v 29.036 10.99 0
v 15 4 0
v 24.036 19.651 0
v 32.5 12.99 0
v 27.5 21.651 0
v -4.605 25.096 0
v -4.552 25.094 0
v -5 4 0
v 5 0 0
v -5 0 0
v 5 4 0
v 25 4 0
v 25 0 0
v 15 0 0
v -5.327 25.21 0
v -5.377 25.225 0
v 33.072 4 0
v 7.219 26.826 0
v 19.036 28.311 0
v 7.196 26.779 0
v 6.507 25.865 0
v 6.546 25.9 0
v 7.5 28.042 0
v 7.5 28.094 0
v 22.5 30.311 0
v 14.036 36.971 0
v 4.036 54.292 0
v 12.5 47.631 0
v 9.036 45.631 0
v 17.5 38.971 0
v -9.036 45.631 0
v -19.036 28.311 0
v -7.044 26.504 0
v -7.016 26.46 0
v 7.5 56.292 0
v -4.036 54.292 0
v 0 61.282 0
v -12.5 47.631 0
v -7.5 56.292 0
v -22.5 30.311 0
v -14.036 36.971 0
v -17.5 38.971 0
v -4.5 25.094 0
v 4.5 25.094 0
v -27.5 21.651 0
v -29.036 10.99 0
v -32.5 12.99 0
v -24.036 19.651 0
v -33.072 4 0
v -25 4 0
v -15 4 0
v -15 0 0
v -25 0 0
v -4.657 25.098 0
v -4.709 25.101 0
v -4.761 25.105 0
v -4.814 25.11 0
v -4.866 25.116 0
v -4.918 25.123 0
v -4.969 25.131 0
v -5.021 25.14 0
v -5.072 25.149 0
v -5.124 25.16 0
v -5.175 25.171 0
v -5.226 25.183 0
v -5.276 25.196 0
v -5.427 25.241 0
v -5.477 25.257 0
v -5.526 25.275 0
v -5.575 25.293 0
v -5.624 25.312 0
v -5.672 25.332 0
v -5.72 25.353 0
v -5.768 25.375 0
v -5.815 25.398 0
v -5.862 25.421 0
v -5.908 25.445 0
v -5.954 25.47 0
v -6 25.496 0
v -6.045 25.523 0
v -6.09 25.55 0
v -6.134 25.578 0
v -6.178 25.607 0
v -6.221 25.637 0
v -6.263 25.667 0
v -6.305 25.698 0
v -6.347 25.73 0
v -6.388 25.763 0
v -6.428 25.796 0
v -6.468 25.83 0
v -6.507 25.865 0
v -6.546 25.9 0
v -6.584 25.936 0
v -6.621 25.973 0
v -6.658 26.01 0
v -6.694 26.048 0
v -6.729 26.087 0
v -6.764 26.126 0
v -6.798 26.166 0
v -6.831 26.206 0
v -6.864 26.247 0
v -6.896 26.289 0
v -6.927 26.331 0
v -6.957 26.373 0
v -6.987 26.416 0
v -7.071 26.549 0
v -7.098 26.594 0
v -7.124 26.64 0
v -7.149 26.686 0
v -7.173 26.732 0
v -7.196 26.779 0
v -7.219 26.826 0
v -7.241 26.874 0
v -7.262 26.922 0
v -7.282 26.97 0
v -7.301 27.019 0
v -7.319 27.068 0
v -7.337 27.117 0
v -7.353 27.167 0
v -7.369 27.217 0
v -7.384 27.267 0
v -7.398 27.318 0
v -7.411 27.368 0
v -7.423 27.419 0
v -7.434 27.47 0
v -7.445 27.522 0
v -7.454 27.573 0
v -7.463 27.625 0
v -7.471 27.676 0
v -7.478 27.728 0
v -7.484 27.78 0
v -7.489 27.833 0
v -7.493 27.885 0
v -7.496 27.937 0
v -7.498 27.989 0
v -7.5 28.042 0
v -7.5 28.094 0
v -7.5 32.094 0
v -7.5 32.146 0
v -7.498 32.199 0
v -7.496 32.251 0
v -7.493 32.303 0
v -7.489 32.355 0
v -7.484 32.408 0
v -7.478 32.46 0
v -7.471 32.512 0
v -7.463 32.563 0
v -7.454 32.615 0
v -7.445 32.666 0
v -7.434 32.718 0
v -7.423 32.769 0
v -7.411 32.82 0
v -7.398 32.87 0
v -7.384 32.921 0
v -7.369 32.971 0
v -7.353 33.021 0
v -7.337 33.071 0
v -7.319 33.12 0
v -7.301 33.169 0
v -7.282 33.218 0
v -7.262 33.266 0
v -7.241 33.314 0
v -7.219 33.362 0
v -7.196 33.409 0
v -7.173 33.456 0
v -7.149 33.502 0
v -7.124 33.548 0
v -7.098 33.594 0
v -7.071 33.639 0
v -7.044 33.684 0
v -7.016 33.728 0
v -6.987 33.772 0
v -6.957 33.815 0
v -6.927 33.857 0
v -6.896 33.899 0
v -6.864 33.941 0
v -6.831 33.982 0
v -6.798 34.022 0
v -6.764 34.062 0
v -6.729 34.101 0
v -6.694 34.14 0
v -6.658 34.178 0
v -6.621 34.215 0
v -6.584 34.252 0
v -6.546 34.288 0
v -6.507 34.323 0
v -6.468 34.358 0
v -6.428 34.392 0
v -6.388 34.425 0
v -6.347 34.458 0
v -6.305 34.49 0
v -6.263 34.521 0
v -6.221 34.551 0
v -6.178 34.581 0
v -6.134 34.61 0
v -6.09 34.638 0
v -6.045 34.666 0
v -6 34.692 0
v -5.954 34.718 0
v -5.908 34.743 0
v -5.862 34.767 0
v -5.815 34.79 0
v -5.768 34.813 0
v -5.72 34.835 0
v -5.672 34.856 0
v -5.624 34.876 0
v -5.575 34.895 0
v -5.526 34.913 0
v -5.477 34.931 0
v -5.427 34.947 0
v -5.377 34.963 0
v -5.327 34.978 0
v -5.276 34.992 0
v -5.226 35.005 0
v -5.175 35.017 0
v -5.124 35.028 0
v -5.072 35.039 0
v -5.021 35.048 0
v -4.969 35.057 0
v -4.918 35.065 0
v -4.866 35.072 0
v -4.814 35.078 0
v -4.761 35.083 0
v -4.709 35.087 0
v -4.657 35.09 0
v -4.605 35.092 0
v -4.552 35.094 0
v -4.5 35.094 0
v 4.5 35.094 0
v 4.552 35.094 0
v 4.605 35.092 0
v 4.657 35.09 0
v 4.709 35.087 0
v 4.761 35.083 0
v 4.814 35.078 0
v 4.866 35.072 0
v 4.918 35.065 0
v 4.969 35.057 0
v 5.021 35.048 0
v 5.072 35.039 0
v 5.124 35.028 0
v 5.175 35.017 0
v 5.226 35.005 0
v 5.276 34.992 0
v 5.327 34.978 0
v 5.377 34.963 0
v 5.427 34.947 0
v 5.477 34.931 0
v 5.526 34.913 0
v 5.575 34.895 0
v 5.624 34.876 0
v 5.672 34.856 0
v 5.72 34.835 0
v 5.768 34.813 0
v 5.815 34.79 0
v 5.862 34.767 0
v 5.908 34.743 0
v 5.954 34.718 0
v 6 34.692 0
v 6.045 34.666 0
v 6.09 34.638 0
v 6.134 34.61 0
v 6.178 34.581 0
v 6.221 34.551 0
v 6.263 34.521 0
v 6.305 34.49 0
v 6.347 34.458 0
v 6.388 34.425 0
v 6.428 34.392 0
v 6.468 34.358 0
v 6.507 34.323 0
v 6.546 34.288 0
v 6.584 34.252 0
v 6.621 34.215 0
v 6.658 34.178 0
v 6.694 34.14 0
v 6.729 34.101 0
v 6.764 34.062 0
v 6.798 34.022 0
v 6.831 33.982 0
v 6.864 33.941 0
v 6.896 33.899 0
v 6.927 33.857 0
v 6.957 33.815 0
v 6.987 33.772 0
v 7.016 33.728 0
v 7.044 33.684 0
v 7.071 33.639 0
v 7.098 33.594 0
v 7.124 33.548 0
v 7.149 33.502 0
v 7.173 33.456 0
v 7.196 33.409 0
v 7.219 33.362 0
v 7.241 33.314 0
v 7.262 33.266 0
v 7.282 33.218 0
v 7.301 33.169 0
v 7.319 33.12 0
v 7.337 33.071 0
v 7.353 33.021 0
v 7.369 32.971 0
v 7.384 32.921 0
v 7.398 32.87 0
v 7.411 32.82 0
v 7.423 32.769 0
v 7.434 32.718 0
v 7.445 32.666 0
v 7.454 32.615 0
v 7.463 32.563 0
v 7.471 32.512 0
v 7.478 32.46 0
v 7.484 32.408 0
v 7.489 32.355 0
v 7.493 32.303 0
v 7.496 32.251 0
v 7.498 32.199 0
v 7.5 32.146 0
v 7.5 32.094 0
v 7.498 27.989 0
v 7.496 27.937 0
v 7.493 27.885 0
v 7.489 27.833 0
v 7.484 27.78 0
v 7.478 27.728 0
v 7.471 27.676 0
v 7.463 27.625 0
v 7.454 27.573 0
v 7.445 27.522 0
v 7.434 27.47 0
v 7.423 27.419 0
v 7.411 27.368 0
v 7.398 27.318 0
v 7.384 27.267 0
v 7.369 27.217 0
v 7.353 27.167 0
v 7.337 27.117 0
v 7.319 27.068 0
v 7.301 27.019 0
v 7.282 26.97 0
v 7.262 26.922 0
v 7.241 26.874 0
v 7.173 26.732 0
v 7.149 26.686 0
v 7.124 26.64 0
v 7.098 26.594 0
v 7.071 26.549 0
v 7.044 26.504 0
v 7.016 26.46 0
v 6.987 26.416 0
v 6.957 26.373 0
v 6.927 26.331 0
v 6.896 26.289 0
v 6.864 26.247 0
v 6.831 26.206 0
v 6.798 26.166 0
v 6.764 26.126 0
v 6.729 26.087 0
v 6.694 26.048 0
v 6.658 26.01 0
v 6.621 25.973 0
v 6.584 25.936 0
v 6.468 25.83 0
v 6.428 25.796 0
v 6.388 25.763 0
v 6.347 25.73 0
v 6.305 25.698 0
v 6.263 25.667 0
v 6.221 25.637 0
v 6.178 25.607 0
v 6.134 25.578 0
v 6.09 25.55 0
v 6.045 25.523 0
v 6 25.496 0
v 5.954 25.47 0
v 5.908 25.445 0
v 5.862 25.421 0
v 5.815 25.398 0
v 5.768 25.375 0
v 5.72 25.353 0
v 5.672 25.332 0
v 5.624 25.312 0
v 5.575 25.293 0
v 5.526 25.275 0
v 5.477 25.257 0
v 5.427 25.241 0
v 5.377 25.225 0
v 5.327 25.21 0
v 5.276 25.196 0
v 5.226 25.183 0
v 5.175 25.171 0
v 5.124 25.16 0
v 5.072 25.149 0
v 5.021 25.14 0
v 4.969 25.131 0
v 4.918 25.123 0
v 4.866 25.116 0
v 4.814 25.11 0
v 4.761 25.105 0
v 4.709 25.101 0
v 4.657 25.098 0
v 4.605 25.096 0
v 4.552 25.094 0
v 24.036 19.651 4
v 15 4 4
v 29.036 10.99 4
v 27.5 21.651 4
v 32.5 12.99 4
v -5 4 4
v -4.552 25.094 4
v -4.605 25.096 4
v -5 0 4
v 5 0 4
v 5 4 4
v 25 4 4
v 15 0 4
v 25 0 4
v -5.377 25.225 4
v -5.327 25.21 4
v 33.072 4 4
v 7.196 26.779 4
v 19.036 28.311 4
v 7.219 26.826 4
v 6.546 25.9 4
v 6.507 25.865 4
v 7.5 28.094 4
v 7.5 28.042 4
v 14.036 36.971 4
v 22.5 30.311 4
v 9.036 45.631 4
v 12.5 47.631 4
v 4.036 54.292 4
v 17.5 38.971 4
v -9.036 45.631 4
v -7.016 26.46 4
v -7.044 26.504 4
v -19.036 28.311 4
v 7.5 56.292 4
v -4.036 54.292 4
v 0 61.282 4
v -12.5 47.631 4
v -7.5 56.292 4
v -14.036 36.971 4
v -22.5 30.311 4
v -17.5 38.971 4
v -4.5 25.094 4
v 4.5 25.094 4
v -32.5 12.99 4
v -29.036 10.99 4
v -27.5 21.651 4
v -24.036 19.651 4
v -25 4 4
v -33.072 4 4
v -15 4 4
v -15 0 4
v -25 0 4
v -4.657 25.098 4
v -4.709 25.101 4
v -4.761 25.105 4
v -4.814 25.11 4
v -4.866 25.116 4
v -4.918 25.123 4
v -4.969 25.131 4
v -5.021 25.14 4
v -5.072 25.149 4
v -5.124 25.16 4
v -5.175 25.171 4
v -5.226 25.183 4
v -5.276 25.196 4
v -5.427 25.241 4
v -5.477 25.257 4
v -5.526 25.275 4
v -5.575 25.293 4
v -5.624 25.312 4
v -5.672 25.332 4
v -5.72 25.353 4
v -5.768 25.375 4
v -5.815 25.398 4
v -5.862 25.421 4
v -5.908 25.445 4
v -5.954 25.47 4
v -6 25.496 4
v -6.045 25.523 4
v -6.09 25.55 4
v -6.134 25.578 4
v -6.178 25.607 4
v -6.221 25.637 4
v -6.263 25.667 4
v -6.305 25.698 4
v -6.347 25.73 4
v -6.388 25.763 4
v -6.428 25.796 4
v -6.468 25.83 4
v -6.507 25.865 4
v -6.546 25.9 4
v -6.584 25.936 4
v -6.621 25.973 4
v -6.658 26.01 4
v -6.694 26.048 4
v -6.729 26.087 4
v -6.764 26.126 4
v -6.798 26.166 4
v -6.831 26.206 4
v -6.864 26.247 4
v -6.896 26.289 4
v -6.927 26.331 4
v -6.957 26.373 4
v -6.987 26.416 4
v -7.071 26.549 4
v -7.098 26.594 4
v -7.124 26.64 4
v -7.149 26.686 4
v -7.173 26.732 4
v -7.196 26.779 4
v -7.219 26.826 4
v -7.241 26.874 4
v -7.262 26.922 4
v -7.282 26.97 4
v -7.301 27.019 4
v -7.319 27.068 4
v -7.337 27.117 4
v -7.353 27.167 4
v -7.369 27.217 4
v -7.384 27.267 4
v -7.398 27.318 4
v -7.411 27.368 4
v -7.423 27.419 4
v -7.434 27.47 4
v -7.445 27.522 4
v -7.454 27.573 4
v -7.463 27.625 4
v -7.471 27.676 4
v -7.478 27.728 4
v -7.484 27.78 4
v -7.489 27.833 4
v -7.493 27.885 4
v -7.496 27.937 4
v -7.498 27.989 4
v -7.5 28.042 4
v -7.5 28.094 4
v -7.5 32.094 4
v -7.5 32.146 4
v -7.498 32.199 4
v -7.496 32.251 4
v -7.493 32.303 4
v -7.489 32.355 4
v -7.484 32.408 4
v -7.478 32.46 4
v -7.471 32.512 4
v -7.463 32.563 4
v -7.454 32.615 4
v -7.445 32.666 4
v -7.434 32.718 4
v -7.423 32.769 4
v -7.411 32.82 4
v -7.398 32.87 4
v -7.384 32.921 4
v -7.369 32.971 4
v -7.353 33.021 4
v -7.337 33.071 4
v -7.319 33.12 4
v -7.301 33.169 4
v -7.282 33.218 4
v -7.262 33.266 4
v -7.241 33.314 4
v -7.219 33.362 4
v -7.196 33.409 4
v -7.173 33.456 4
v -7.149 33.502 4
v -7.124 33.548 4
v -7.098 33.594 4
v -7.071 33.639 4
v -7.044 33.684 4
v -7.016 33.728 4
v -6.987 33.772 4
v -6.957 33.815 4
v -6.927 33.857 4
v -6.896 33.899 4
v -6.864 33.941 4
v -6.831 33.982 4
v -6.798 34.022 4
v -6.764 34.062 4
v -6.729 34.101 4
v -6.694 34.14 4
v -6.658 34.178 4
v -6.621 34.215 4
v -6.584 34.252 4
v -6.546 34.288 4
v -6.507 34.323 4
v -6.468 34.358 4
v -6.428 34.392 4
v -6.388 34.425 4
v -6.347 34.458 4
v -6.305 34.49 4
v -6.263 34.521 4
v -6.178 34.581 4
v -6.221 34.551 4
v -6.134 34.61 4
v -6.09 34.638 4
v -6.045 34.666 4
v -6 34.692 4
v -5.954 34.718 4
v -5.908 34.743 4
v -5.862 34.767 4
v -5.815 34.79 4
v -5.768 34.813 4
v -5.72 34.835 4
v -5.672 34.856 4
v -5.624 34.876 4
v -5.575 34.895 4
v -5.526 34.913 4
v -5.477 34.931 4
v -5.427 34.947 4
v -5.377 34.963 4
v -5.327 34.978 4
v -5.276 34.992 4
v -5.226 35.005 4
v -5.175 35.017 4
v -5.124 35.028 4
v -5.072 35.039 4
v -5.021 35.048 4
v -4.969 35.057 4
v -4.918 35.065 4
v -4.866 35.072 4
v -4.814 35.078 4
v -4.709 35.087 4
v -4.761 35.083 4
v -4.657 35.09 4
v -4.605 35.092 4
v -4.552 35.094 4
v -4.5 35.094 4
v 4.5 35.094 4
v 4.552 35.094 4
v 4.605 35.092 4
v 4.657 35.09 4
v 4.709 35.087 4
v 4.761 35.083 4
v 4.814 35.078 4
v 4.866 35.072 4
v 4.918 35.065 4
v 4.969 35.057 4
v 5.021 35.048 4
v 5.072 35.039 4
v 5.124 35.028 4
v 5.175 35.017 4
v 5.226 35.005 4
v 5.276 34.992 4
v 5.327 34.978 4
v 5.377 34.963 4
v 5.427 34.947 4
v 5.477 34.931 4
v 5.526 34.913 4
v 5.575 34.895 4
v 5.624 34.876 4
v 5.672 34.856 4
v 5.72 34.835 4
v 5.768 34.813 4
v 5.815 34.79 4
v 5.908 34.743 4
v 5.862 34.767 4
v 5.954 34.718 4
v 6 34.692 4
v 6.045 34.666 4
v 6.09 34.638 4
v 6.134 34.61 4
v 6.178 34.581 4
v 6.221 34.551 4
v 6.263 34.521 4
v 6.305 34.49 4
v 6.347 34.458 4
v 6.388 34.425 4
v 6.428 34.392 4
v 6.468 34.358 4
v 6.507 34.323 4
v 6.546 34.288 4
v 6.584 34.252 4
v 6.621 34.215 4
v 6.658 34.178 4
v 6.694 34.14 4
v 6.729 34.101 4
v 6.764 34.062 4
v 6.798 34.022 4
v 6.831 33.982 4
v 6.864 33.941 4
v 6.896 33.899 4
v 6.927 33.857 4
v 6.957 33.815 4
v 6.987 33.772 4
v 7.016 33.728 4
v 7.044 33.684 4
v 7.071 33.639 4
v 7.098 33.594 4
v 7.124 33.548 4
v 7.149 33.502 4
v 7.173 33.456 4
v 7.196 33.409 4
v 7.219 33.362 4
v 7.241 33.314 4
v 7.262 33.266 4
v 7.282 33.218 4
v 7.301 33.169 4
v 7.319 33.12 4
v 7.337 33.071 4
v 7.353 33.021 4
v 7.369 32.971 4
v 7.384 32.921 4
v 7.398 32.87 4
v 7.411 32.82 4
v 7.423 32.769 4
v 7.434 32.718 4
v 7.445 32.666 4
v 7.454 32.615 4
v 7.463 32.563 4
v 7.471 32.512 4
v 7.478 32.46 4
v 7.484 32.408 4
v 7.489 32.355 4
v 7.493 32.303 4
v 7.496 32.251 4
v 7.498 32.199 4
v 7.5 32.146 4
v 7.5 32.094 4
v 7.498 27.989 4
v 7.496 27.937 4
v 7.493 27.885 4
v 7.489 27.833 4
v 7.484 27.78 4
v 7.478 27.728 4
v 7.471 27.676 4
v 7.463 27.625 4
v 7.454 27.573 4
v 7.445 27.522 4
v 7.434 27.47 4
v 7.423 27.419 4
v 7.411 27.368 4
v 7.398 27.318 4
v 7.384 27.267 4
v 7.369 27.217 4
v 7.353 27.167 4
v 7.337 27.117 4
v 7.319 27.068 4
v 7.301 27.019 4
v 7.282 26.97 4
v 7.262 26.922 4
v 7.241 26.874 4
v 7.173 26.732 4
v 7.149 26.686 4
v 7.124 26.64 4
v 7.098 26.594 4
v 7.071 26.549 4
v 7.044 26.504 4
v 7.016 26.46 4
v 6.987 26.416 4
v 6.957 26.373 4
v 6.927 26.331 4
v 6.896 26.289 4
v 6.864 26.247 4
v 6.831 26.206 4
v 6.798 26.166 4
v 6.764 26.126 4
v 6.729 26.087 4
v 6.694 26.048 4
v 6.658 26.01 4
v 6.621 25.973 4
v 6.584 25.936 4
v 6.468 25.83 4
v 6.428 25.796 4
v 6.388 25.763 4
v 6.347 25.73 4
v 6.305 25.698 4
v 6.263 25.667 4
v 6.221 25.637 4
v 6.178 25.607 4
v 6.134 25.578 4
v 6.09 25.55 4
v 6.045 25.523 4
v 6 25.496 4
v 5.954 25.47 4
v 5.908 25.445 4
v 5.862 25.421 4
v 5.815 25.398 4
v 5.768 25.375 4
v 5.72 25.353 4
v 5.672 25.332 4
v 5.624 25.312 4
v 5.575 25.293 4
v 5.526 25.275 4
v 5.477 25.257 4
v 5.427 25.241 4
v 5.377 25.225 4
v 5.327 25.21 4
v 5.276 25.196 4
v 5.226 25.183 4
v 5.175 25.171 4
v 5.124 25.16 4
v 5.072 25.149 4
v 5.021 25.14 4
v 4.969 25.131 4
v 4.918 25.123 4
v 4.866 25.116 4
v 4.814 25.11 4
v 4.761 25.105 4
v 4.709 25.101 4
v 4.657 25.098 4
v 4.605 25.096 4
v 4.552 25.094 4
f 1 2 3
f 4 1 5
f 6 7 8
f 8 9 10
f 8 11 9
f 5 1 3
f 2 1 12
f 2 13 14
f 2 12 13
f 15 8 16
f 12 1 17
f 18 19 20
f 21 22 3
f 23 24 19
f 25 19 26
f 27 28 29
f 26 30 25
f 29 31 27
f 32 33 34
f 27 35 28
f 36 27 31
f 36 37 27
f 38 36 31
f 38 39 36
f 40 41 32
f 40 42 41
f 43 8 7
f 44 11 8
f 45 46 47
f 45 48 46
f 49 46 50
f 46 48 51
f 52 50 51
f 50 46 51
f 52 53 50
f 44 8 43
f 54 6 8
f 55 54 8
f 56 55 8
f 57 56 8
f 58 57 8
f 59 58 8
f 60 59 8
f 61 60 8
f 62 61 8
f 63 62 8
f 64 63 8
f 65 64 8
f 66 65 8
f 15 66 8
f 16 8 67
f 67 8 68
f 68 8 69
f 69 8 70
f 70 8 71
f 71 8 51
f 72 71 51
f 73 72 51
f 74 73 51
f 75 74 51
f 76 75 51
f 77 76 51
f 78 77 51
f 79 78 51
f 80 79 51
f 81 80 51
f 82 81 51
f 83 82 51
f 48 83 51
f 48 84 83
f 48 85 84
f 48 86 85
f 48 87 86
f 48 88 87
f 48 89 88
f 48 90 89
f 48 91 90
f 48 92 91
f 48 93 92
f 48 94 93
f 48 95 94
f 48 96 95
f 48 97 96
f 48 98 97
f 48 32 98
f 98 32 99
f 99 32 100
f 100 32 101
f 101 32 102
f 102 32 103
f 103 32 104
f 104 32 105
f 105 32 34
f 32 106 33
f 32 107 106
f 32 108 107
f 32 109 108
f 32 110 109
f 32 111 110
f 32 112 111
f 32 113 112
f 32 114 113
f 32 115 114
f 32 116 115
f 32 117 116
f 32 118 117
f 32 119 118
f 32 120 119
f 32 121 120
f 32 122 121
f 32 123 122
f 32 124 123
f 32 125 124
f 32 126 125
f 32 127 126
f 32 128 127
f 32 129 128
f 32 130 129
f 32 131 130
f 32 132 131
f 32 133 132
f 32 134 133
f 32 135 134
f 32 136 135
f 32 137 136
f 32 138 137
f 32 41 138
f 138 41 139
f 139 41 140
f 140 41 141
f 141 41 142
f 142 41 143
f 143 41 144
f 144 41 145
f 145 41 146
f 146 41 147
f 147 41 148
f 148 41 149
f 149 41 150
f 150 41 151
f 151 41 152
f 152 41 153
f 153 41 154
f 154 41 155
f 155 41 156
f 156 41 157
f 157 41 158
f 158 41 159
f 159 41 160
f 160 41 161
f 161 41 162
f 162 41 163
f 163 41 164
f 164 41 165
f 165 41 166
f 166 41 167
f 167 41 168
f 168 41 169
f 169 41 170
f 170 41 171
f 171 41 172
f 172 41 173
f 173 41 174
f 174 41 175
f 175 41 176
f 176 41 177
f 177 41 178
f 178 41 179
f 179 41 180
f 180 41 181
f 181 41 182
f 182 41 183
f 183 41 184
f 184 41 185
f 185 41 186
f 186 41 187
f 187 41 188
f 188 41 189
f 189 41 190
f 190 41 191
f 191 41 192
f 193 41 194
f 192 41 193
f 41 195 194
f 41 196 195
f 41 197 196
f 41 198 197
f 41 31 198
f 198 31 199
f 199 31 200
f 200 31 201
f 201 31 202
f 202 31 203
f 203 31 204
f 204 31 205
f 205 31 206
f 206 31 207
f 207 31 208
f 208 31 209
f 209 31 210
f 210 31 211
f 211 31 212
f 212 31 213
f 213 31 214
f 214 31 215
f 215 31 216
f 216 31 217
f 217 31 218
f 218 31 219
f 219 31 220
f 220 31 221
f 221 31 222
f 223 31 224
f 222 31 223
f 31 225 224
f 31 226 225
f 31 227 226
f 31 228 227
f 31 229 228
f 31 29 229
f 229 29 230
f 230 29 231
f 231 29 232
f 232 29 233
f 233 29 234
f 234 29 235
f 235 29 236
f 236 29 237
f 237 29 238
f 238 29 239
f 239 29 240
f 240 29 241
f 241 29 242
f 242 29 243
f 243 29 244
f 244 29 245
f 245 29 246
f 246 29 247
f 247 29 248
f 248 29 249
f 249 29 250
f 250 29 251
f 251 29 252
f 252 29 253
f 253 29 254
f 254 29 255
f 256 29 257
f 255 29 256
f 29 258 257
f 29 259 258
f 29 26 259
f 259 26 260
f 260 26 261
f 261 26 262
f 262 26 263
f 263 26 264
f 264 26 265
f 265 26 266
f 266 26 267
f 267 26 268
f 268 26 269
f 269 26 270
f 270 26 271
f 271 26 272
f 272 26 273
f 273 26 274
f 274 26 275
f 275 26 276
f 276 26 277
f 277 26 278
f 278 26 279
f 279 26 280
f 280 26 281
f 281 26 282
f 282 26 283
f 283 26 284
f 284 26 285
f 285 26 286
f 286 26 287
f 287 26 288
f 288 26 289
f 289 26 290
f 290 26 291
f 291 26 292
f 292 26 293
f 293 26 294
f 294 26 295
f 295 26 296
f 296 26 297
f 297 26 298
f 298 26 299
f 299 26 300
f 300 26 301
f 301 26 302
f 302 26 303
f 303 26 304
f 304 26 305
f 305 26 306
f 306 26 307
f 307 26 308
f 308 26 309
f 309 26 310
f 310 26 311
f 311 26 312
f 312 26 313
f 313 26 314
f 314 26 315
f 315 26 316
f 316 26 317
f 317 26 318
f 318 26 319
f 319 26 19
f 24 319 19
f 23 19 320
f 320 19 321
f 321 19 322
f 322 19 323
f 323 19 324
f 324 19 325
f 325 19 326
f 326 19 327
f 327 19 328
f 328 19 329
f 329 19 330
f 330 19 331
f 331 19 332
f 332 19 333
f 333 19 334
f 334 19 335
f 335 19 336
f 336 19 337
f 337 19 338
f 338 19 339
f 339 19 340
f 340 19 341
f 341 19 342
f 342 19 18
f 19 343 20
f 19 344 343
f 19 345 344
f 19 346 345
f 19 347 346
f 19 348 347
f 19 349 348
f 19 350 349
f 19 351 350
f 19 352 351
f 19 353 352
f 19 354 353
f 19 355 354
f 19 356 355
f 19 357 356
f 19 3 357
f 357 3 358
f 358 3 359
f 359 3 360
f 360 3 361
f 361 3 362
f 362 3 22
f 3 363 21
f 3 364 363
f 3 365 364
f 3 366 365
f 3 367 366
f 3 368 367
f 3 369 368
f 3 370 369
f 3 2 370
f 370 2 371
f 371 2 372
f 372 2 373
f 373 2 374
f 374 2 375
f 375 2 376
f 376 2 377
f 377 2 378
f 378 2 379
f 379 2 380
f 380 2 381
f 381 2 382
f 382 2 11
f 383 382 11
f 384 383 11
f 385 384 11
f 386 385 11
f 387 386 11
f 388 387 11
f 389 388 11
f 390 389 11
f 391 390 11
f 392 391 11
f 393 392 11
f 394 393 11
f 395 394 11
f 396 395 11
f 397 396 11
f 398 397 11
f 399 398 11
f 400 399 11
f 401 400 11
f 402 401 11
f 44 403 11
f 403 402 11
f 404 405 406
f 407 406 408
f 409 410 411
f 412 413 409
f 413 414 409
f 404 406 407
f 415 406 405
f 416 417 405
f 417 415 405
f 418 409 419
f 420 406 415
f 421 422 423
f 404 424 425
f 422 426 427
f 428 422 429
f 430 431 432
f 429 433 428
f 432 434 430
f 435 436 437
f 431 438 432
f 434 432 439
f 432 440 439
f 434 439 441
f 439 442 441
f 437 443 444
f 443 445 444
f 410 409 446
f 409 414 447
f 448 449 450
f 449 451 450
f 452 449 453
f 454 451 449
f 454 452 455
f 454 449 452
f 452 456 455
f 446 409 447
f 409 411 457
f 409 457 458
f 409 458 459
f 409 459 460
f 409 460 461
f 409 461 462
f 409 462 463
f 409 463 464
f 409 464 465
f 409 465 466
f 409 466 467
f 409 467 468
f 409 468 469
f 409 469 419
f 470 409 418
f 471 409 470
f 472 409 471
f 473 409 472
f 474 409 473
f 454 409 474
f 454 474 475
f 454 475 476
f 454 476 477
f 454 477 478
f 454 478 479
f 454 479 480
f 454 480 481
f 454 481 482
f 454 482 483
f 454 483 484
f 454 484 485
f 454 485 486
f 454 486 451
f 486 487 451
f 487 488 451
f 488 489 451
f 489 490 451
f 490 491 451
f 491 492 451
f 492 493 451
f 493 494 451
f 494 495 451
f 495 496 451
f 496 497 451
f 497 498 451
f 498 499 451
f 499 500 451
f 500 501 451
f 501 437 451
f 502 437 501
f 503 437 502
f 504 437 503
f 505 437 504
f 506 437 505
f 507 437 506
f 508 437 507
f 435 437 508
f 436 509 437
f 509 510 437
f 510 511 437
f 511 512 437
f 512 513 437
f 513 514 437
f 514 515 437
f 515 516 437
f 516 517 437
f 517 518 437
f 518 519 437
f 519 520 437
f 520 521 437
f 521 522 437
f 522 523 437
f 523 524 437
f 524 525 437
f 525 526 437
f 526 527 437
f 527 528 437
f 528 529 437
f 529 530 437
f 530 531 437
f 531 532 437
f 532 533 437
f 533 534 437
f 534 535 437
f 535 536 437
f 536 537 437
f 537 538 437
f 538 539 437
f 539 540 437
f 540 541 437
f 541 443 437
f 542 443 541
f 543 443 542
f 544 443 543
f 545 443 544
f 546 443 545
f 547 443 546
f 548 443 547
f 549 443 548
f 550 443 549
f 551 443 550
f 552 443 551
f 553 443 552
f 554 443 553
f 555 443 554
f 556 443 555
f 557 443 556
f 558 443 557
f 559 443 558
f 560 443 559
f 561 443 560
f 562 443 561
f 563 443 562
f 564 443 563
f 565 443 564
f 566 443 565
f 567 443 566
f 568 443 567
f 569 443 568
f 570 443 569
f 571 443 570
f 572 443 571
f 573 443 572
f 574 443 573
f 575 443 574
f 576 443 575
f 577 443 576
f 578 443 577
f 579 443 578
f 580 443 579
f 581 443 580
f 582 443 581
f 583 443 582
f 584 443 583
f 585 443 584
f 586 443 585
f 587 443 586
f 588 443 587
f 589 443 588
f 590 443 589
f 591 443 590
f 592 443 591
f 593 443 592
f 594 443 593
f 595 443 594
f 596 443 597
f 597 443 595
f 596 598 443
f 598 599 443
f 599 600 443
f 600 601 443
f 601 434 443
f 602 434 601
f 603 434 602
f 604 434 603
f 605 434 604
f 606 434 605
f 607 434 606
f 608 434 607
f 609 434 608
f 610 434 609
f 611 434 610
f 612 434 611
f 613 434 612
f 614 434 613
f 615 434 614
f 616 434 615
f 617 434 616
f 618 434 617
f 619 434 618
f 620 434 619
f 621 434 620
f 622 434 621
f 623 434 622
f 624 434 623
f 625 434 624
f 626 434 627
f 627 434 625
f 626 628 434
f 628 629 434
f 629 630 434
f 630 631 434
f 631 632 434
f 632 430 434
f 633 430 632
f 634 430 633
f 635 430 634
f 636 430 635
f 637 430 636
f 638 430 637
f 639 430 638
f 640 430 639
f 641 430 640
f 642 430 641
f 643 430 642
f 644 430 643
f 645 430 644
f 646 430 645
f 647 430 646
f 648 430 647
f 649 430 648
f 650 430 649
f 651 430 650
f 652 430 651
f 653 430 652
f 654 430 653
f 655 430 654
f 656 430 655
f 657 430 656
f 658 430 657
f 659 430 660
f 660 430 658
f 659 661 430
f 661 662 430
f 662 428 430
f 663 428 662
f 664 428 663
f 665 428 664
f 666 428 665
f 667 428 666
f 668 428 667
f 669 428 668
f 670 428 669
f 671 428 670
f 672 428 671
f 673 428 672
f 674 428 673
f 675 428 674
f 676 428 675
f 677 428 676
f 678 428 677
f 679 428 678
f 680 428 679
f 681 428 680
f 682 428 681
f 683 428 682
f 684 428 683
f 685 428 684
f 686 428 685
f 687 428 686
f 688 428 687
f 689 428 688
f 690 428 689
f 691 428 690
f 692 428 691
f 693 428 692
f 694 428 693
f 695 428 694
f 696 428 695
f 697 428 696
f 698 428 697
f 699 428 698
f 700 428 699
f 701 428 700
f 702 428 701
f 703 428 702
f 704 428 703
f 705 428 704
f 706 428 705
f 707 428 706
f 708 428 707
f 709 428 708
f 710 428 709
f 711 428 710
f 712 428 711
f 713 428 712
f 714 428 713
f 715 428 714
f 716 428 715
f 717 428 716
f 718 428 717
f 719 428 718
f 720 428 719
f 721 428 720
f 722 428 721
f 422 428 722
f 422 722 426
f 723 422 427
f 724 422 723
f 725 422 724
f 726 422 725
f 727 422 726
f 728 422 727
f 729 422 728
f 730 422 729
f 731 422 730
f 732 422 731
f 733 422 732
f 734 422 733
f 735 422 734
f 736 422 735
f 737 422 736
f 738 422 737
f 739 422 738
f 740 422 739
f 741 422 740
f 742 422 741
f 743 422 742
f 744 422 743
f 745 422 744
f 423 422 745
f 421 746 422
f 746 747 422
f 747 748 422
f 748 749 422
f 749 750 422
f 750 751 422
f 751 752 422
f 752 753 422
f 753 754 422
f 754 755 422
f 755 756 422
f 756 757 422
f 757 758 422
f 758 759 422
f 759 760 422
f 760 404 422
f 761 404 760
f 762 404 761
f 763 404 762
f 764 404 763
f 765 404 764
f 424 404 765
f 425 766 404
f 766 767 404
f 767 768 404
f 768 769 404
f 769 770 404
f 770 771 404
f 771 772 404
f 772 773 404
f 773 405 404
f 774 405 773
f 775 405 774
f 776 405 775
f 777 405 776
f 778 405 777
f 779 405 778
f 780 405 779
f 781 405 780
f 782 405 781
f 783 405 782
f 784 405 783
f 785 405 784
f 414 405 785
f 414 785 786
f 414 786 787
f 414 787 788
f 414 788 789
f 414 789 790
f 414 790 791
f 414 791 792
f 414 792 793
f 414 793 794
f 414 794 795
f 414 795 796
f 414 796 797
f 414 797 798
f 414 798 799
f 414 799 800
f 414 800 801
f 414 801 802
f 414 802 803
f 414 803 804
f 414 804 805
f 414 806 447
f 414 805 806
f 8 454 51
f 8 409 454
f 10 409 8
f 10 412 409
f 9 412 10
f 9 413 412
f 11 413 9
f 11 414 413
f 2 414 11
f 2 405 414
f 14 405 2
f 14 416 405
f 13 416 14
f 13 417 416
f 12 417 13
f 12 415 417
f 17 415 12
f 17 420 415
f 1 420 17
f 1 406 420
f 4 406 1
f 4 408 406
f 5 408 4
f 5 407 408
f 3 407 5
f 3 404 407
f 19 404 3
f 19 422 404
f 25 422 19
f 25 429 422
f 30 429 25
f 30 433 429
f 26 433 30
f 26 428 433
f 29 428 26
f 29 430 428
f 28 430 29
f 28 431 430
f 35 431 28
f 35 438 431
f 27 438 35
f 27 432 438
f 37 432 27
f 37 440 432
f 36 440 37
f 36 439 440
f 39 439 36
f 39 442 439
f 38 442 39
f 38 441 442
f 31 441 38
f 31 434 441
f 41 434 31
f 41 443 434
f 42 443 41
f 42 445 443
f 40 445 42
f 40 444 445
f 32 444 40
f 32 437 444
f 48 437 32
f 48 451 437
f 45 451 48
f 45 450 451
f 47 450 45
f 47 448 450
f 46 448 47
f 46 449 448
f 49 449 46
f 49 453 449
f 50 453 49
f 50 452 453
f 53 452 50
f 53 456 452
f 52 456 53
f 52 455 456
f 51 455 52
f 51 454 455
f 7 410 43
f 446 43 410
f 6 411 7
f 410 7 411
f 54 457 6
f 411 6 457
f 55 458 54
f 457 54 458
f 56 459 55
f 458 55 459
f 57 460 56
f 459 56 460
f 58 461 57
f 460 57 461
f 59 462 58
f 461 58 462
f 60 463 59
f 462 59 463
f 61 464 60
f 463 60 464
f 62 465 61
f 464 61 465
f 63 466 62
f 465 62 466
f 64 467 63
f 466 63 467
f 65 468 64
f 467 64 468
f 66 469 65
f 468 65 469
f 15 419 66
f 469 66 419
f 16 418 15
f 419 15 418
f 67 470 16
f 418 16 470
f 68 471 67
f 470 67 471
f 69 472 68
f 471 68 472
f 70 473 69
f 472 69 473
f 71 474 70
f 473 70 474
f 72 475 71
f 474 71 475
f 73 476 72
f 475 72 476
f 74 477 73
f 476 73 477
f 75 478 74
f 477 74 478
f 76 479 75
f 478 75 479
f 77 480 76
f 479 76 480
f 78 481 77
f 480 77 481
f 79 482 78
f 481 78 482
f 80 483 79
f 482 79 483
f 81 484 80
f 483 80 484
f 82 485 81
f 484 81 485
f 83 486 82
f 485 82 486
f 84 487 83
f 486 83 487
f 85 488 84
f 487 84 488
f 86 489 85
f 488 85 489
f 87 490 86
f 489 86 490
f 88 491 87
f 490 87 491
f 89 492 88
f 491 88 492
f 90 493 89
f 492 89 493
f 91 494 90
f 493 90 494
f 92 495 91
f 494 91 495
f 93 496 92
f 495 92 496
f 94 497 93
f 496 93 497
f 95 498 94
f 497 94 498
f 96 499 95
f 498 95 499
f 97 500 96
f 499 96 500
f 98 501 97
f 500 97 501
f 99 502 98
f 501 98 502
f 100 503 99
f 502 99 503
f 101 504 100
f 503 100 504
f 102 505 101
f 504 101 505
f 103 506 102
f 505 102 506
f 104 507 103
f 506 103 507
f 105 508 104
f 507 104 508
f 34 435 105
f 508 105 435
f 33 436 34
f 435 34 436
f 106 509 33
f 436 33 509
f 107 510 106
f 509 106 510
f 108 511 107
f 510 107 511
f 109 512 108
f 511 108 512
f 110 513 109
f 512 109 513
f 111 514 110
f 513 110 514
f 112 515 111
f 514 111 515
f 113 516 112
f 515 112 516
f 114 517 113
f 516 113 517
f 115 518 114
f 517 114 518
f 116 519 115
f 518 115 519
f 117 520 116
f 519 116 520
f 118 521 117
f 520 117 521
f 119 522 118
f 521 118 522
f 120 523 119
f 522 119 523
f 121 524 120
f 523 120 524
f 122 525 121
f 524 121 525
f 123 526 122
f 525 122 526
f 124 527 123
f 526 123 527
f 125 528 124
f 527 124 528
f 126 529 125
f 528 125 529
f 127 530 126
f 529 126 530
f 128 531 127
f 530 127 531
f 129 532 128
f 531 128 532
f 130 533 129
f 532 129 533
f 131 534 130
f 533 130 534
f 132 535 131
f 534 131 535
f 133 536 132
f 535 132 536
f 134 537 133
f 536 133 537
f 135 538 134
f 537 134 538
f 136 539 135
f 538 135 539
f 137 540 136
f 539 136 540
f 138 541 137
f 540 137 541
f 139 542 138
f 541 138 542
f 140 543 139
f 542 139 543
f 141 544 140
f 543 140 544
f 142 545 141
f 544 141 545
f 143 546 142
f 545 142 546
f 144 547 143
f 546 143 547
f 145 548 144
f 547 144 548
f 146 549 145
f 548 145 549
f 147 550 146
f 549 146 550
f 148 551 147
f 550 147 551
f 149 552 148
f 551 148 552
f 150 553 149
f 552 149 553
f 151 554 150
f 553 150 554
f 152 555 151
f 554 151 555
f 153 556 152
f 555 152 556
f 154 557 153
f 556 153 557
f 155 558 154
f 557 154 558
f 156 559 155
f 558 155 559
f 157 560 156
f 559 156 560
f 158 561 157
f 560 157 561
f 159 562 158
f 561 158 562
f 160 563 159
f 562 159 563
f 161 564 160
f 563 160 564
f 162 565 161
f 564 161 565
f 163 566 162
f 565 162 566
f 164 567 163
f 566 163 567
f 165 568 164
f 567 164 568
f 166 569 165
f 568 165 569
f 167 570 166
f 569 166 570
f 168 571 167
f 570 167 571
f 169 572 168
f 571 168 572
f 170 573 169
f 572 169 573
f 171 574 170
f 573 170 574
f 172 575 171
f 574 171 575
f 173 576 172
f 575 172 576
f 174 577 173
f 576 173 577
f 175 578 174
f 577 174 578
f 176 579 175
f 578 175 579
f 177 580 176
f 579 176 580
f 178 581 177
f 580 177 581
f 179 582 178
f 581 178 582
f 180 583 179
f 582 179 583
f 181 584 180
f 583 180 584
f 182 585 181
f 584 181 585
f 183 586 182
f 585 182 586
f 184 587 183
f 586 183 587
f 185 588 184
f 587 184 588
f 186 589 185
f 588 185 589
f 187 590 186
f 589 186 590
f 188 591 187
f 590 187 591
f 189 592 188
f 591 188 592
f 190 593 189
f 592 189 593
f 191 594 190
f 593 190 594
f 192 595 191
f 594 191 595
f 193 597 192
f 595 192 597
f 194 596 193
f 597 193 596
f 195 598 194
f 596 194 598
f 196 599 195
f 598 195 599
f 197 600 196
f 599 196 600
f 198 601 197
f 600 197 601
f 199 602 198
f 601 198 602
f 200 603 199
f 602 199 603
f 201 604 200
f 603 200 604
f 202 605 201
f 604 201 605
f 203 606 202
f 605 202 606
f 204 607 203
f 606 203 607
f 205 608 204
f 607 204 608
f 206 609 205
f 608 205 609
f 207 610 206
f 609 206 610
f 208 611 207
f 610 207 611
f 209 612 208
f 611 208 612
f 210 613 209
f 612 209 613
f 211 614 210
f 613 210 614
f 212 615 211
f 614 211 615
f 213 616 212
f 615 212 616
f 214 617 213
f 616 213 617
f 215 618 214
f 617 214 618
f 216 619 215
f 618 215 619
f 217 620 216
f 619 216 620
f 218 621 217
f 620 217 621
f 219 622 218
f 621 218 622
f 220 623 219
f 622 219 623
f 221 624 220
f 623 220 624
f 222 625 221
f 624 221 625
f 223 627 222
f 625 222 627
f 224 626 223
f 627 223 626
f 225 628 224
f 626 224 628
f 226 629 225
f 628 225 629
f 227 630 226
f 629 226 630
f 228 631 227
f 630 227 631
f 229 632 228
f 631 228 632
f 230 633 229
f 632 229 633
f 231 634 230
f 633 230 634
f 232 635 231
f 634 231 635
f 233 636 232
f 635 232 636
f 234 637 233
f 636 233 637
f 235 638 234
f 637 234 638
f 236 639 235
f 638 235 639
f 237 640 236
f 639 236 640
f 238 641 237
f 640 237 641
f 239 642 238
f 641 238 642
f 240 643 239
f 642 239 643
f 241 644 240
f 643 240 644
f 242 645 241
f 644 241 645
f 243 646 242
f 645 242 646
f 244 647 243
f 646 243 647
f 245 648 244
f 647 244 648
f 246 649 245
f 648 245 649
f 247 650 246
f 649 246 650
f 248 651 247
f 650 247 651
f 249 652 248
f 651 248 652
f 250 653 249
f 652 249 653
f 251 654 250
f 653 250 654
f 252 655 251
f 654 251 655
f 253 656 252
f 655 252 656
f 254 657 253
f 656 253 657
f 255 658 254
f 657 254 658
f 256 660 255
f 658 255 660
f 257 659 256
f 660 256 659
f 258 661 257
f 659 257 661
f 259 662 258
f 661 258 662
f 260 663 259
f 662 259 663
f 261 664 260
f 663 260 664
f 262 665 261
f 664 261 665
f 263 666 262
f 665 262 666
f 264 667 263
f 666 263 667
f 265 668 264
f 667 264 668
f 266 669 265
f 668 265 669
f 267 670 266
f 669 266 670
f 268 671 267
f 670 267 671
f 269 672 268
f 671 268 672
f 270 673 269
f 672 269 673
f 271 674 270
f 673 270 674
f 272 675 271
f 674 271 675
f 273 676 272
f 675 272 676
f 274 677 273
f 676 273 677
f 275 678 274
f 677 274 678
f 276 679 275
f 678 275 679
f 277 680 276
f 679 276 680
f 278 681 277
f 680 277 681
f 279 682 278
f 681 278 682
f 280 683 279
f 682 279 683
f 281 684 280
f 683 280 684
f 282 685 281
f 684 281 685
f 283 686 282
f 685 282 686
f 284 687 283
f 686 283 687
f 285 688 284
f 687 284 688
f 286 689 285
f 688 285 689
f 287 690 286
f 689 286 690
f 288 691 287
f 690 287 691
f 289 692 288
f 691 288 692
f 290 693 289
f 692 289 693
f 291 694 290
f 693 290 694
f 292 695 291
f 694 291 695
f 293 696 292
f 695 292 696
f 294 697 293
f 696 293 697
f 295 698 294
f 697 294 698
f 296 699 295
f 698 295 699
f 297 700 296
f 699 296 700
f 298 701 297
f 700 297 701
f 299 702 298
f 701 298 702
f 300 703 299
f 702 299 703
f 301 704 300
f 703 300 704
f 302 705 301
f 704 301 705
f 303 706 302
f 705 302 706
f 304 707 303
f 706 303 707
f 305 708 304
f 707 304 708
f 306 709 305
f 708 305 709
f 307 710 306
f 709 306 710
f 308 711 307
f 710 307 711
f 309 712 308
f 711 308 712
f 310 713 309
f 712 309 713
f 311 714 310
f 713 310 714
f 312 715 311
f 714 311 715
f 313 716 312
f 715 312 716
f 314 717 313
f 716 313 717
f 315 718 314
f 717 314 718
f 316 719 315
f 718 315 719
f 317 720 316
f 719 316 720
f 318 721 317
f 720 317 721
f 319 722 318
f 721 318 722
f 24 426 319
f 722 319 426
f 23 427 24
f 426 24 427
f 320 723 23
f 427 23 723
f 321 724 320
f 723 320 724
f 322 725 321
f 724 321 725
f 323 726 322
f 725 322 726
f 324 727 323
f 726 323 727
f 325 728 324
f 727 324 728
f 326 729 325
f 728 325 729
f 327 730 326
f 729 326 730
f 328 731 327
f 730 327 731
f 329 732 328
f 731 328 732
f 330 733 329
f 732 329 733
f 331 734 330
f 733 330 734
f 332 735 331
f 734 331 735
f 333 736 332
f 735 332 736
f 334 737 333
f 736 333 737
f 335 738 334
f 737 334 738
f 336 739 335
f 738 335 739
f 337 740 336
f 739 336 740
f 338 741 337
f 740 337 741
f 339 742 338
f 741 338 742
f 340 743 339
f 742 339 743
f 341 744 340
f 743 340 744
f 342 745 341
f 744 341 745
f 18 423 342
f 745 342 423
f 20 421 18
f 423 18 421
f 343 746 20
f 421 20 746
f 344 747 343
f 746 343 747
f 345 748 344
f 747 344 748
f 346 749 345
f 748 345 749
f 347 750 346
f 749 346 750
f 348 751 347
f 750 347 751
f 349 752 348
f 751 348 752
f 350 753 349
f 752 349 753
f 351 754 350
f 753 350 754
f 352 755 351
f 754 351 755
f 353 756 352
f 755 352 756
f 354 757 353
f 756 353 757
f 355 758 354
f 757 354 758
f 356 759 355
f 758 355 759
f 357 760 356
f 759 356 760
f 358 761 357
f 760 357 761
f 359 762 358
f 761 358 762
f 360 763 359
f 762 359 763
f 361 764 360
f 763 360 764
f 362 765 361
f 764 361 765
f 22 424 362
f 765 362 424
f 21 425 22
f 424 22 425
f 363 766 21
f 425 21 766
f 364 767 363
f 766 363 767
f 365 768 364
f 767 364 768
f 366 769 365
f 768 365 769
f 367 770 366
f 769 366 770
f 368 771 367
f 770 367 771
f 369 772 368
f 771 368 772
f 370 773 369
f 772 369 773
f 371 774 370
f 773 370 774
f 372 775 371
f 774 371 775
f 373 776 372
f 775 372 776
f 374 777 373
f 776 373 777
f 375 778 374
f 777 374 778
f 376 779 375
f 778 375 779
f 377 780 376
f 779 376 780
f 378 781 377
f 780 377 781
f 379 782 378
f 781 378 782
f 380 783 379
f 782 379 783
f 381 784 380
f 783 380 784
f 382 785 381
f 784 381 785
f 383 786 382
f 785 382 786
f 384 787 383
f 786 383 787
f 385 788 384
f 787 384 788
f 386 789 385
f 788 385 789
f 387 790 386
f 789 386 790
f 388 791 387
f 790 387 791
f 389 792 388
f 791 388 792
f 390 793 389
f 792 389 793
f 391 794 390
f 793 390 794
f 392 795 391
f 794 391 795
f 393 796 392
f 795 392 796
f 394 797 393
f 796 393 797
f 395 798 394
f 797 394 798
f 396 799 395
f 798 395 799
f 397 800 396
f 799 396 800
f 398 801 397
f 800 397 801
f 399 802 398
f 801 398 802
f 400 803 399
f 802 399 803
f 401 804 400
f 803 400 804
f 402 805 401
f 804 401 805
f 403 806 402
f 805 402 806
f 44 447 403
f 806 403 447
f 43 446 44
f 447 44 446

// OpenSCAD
/* 
 * Stackenlichten-Files I: The top plate
 *
 * kellertuer, 2017-02-19
 * int2k, 2018-01-01    Added switchable holes
 */

/*
 * Variables, all Data in mm
 */
lower = false;  // Lower hole (Enable if you use the LED-Holder // Disable when you use WS2812-3M-Strips)
upper = true;   
wW = 4;    // Thickness/Width of wood
mW = 4;    //                 of a Magnet-Cube
fW = 2;    // Thickness of the front plastic plate
sL = 80;   // sidelength of a triangle
bD = 80;   // Depth of a box (depth w.r.t. frontview)
fC = 3;    // number of fingers in the triangle
fD = 4;    // number on fingers downwards
pW = 12; //width of plug inlet
pD = 8; //depth of plug inlet
pS = 40; //shift from baseline of plug inlet
// don't change these values
nC = 2*fC+2; //number of Divisions, due to 2fC+1 segments and one segment that split in the corners
sH = 2*(wW/tan(60)+wW/sin(60)); //shorten inner

// concat with shfted rotated versions... bottom left right

bottomPlate();
//color([.3,.3,.3]) translate([0,sL*sqrt(3)/6,]) circle(r=5,$fn=360,center=true);
hR = 3;

module bottomPlate() {
    linear_extrude(height=wW, twist=0)
    difference() {
    polygon(points=concat(
            genInnerSide(0,[0,0],sH,sH),
            genInnerSide(-120,[sL/4,sL*sqrt(3)/4],sH,sH),
            genInnerSide(120,[-sL/4,sL*sqrt(3)/4],sH,sH)
        ));
        if (upper) {
            translate([0,sL*sqrt(3)/6+7]) hull() {
            translate([-7.5+hR,-5+hR]) circle(r=hR,$fn=360);
            translate([-7.5+hR, 5-hR]) circle(r=hR,$fn=360);
            translate([ 7.5-hR,-5+hR]) circle(r=hR,$fn=360);
            translate([ 7.5-hR, 5-hR]) circle(r=hR,$fn=360);
            };
       }
        if (lower) {
            translate([0,sL*sqrt(3)/6-7]) hull() {
            translate([-7.5+hR,-5+hR]) circle(r=hR,$fn=360);
            translate([-7.5+hR, 5-hR]) circle(r=hR,$fn=360);
            translate([ 7.5-hR,-5+hR]) circle(r=hR,$fn=360);
            translate([ 7.5-hR, 5-hR]) circle(r=hR,$fn=360);
            };
        }
};
};

/*
 * Helping Functions - Generate one side of the triangle recursion olé olé
 */
function genInnerSide(a=0,v=[0,0],sLe=0,sRi=0,h=wW) = generateInnerSide([rotM(a)*[-(sL-sLe)/2,h]+v],0,a,v,sLe,sRi,h);   
//Recursively generate fC toothes
function generateInnerSide(pL,i,a,v,sLe,sRi,h) = (i==fC) ? concat(pL,[rotM(a)*[(sL-sRi)/2,h]+v])
    : generateInnerSide(concat(pL,[
        rotM(a)*[-sL/2+(2*i+2.5)*sL/nC,h]+v, rotM(a)*[-sL/2+(2*i+2.5)*sL/nC,0]+v,
        rotM(a)*[-sL/2+(2*i+1.5)*sL/nC,0]+v, rotM(a)*[-sL/2+(2*i+1.5)*sL/nC,h]+v
        ]),i+1,a,v,sLe,sRi,h);
function rotM(a) = [[cos(a),sin(a)],[-sin(a),cos(a)]];
